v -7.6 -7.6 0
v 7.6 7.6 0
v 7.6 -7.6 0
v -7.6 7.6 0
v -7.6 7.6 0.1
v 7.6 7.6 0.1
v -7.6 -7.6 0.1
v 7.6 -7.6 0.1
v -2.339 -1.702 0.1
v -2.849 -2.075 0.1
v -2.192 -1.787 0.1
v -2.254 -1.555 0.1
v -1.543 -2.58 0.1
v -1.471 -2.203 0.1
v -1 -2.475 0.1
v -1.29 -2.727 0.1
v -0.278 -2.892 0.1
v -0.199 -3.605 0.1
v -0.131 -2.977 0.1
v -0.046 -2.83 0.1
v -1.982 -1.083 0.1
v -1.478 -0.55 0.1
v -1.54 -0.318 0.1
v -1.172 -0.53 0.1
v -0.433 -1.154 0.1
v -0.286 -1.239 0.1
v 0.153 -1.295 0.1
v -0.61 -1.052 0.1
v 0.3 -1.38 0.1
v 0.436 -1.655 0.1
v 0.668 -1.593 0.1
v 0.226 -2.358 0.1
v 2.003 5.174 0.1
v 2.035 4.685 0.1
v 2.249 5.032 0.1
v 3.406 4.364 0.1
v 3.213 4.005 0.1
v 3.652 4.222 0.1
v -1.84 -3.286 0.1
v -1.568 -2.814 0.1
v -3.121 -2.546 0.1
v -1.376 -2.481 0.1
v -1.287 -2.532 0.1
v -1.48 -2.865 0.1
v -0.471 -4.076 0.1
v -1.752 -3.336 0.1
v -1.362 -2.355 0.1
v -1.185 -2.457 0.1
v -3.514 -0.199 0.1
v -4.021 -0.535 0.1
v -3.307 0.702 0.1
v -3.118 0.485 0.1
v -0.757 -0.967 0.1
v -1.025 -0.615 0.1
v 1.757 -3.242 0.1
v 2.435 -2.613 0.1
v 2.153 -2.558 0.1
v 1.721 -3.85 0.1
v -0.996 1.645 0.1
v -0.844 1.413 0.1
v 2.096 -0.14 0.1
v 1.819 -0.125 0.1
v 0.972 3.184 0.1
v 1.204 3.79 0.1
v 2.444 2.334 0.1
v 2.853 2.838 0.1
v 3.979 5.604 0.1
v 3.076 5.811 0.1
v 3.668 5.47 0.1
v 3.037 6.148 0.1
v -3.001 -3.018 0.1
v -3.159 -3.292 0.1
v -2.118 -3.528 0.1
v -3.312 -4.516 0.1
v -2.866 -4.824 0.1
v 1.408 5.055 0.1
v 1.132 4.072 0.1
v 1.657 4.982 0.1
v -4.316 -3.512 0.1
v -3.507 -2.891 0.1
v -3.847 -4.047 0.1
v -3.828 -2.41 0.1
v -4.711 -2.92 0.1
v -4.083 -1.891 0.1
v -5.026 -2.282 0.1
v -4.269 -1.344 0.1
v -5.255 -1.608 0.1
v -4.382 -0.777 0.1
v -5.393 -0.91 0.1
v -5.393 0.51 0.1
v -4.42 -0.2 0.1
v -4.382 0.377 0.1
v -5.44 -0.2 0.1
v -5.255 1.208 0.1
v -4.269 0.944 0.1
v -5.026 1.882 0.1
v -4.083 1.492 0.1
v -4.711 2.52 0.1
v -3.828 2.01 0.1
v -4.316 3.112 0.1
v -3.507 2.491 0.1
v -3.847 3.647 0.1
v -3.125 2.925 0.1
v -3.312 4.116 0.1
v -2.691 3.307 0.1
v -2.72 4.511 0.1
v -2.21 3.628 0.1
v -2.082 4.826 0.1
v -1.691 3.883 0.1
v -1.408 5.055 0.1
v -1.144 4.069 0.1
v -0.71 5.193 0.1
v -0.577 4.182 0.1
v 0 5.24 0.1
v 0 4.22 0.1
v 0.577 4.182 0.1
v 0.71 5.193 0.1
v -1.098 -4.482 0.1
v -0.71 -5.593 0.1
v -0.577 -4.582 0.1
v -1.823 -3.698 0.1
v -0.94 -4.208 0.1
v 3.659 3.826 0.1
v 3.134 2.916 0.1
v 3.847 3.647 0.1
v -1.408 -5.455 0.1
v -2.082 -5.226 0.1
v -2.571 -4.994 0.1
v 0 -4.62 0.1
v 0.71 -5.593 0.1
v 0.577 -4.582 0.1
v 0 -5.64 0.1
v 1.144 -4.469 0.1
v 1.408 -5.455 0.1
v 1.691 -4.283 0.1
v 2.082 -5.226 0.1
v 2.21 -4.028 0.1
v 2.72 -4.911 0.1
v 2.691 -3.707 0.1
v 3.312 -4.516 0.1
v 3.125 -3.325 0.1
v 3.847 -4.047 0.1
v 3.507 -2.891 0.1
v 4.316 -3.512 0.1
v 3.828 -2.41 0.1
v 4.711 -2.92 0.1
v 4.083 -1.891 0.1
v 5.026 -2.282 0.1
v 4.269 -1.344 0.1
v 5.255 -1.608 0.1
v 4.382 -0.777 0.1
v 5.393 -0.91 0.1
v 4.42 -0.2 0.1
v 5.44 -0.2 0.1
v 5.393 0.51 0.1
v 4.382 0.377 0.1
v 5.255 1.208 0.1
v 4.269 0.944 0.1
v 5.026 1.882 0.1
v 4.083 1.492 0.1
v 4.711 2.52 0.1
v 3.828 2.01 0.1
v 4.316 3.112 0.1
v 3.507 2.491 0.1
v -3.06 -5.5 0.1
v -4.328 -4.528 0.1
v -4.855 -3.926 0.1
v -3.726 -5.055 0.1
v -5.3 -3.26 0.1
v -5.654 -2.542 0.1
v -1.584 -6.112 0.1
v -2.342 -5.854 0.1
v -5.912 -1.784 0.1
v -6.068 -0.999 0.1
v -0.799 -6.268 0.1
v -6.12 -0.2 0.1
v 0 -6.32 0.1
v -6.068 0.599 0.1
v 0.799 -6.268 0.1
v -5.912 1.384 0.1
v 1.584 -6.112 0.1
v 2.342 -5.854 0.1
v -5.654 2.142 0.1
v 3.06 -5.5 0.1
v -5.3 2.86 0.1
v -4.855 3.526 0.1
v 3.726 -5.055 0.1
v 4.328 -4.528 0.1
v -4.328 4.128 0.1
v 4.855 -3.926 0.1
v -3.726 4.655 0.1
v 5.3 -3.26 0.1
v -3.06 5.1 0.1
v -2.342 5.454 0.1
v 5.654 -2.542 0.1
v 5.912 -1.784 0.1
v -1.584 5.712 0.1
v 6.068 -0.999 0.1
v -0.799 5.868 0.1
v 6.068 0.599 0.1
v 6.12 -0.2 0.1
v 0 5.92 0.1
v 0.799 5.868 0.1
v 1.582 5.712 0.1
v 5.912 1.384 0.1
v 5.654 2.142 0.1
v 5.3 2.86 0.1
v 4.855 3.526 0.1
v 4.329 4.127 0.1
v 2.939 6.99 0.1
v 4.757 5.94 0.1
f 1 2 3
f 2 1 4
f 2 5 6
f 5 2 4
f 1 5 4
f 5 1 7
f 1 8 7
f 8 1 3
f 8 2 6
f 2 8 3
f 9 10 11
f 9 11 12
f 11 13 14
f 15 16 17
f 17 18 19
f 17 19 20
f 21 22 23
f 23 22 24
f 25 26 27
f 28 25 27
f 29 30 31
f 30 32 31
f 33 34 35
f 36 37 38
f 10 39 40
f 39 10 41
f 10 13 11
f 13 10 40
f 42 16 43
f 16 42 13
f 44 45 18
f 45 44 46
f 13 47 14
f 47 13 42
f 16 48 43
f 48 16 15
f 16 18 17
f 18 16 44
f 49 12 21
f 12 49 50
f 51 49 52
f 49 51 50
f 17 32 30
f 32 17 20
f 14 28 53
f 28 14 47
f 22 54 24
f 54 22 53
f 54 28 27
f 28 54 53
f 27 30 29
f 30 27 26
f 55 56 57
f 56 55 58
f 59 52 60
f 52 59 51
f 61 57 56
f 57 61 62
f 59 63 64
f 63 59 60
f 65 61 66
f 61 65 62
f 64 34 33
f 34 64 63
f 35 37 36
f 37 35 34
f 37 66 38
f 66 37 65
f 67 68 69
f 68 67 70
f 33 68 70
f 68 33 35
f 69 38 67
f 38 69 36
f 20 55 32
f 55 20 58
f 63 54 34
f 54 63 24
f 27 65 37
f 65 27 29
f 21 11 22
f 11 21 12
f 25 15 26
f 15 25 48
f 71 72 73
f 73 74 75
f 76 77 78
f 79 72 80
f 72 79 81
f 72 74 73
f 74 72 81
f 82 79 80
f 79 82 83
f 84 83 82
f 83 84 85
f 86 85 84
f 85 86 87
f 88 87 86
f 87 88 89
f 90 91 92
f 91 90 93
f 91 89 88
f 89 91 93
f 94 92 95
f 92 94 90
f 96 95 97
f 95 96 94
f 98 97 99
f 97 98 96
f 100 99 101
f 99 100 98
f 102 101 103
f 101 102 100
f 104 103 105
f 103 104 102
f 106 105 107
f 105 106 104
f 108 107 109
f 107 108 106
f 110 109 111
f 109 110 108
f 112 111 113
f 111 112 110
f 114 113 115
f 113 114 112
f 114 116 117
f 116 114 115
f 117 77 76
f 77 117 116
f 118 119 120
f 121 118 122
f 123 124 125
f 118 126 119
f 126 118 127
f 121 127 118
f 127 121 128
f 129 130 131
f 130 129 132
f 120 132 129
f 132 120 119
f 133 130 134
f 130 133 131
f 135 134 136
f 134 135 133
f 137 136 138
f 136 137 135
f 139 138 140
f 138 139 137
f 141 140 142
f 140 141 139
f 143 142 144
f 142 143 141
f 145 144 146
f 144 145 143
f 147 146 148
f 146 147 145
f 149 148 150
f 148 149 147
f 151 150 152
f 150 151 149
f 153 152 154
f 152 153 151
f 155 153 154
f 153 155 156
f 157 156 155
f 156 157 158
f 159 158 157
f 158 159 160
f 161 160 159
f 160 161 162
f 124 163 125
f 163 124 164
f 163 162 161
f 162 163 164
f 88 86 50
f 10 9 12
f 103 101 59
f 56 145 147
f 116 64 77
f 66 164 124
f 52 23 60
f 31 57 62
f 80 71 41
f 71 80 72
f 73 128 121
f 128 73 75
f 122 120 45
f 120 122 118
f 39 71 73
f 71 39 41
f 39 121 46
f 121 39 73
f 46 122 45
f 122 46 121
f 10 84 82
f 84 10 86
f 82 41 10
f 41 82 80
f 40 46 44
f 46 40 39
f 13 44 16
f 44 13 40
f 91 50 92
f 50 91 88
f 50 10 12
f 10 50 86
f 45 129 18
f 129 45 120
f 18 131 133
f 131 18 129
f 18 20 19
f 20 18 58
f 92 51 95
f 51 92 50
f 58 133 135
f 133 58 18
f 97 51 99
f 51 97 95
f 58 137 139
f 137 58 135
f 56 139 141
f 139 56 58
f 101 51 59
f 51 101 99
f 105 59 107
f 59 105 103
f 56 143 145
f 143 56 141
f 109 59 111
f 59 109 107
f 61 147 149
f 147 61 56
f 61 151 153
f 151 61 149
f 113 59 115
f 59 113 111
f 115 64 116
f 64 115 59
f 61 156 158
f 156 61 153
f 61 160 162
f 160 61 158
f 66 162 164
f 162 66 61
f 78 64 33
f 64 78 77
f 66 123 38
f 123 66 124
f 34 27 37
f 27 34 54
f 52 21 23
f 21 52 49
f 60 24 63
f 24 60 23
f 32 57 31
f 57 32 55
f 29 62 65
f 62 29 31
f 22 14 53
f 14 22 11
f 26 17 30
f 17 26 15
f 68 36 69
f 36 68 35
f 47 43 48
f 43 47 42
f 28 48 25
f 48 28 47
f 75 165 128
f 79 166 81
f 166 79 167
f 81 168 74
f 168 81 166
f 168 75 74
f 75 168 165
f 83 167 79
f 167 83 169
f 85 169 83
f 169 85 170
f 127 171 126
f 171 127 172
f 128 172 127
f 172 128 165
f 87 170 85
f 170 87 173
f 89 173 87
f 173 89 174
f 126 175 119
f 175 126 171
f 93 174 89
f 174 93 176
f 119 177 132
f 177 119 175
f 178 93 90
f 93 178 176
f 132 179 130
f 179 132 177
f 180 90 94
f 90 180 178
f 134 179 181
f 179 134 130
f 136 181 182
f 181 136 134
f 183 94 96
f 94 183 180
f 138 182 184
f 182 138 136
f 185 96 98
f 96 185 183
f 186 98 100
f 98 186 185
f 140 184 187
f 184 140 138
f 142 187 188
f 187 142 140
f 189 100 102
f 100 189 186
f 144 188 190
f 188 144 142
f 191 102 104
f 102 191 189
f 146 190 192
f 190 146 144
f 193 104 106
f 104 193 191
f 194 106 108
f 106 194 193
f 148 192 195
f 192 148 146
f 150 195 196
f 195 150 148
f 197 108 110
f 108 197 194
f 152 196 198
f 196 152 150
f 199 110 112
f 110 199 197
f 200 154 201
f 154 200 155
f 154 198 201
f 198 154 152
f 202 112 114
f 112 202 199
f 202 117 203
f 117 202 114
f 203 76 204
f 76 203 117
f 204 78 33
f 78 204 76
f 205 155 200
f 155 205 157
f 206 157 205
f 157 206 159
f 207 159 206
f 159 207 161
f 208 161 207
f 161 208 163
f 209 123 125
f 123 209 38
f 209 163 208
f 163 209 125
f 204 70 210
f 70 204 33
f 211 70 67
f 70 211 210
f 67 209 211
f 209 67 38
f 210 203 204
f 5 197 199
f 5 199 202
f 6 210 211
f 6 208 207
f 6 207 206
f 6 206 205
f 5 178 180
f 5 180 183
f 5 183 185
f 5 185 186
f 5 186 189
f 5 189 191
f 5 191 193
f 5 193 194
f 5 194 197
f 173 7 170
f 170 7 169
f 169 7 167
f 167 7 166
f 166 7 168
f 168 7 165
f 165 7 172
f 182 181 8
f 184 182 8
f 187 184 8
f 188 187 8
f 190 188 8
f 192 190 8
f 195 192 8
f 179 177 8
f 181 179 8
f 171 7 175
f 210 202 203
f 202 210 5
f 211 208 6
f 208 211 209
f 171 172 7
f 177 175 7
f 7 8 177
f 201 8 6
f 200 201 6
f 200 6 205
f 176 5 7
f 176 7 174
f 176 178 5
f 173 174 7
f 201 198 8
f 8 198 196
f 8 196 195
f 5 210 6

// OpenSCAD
// file: ../p/logo-launchcommand-bg.scad
use <../lib.scad>
function ldraw_lib__logo_launchcommand_bg() = [
// 0 Launch Command Logo Background (without Border)
// 0 Name: logo-launchcommand-bg.dat
// 0 Author: Chris Böhnke [KnightOfTarenta]
// 0 !LDRAW_ORG Primitive UPDATE 2025-05
// 0 !LICENSE Licensed under CC BY 4.0 : see CAreadme.txt
// 
// 0 !HELP Dimensions X = 32; Z = 34.67
// 
// 0 BFC CERTIFY CCW
  [0,"BFC","CERTIFY"],
  [0,"BFC","CCW"],
// 
// 0 !HISTORY 2025-04-27 [OrionP] Official Update 2025-04
// 0 !HISTORY 2025-05-24 [Holly-Wood] Updated description
// 0 !HISTORY 2025-05-28 [OrionP] Official Update 2025-05
// 
// 0 // Colour 16 Main Colour
// 3 16 -12.889 0 -1.697 -12.557 0 -3.365 -11.826 0 -.984
  [3,16,-12.889,0,-1.697,-12.557,0,-3.365,-11.826,0,-.984],
// 3 16 -8.38 0 -5.514 -6.88 0 -4.417 -6.63 0 -3.984
  [3,16,-8.38,0,-5.514,-6.88,0,-4.417,-6.63,0,-3.984],
// 3 16 -9.192 0 9.192 -10.314 0 7.914 -2.929 0 5.426
  [3,16,-9.192,0,9.192,-10.314,0,7.914,-2.929,0,5.426],
// 3 16 7.161 0 -7.097 11.258 0 -6.5 12.01 0 -4.975
  [3,16,7.161,0,-7.097,11.258,0,-6.5,12.01,0,-4.975],
// 3 16 1.697 0 12.889 3.542 0 11.736 3.329 0 12.566
  [3,16,1.697,0,12.889,3.542,0,11.736,3.329,0,12.566],
// 3 16 8.392 0 8.936 10.314 0 7.914 9.218 0 9.166
  [3,16,8.392,0,8.936,10.314,0,7.914,9.218,0,9.166],
// 3 16 -9.171 0 2.016 -4.53 0 -.347 -2.483 0 4.744
  [3,16,-9.171,0,2.016,-4.53,0,-.347,-2.483,0,4.744],
// 3 16 1.965 0 -4.097 6.331 0 -6.934 5.35 0 .222
  [3,16,1.965,0,-4.097,6.331,0,-6.934,5.35,0,.222],
// 4 16 -9.18 0 -6.9 -10.314 0 -7.914 -9.291 0 -9.093 -8.827 0 -8.289
  [4,16,-9.18,0,-6.9,-10.314,0,-7.914,-9.291,0,-9.093,-8.827,0,-8.289],
// 4 16 -7.563 0 -14.1 -5.363 0 -10.289 -6.229 0 -9.789 -8.429 0 -13.6
  [4,16,-7.563,0,-14.1,-5.363,0,-10.289,-6.229,0,-9.789,-8.429,0,-13.6],
// 4 16 -1.386 0 -11.4 -2.765 0 -11.789 -3.229 0 -12.593 -1.697 0 -12.889
  [4,16,-1.386,0,-11.4,-2.765,0,-11.789,-3.229,0,-12.593,-1.697,0,-12.889],
// 4 16 -9.18 0 -6.9 -8.827 0 -8.289 -6.229 0 -9.789 -5.413 0 -9.075
  [4,16,-9.18,0,-6.9,-8.827,0,-8.289,-6.229,0,-9.789,-5.413,0,-9.075],
// 4 16 -5.413 0 -9.075 -6.229 0 -9.789 -5.363 0 -10.289 -5.153 0 -9.225
  [4,16,-5.413,0,-9.075,-6.229,0,-9.789,-5.363,0,-10.289,-5.153,0,-9.225],
// 4 16 -1.386 0 -11.4 -5.153 0 -9.225 -5.363 0 -10.289 -2.765 0 -11.789
  [4,16,-1.386,0,-11.4,-5.153,0,-9.225,-5.363,0,-10.289,-2.765,0,-11.789],
// 4 16 -12.557 0 -3.365 -12.01 0 -4.975 -11.258 0 -6.5 -8.38 0 -5.514
  [4,16,-12.557,0,-3.365,-12.01,0,-4.975,-11.258,0,-6.5,-8.38,0,-5.514],
// 4 16 -10.314 0 -7.914 -9.18 0 -6.9 -8.38 0 -5.514 -11.258 0 -6.5
  [4,16,-10.314,0,-7.914,-9.18,0,-6.9,-8.38,0,-5.514,-11.258,0,-6.5],
// 4 16 -4.613 0 -7.689 -5.413 0 -9.075 -5.153 0 -9.225 -4.353 0 -7.839
  [4,16,-4.613,0,-7.689,-5.413,0,-9.075,-5.153,0,-9.225,-4.353,0,-7.839],
// 4 16 -3.794 0 -7.431 -4.538 0 -7.001 -4.613 0 -7.689 -4.353 0 -7.839
  [4,16,-3.794,0,-7.431,-4.538,0,-7.001,-4.613,0,-7.689,-4.353,0,-7.839],
// 4 16 -12.889 0 -1.697 -11.826 0 -.984 -12.889 0 1.697 -13 0 0
  [4,16,-12.889,0,-1.697,-11.826,0,-.984,-12.889,0,1.697,-13,0,0],
// 4 16 -12.557 0 -3.365 -8.38 0 -5.514 -6.63 0 -3.984 -11.826 0 -.984
  [4,16,-12.557,0,-3.365,-8.38,0,-5.514,-6.63,0,-3.984,-11.826,0,-.984],
// 4 16 -1.697 0 -12.889 0 0 -13 -.586 0 -10.014 -1.386 0 -11.4
  [4,16,-1.697,0,-12.889,0,0,-13,-.586,0,-10.014,-1.386,0,-11.4],
// 4 16 0 0 -13 1.697 0 -12.889 3.365 0 -12.557 -.586 0 -10.014
  [4,16,0,0,-13,1.697,0,-12.889,3.365,0,-12.557,-.586,0,-10.014],
// 4 16 5.061 0 -10.734 -.135 0 -7.734 -.385 0 -8.167 -.586 0 -10.014
  [4,16,5.061,0,-10.734,-.135,0,-7.734,-.385,0,-8.167,-.586,0,-10.014],
// 4 16 -11.826 0 -.984 -9.726 0 2.653 -12.557 0 3.365 -12.889 0 1.697
  [4,16,-11.826,0,-.984,-9.726,0,2.653,-12.557,0,3.365,-12.889,0,1.697],
// 4 16 -.586 0 -10.014 3.365 0 -12.557 4.975 0 -12.01 5.061 0 -10.734
  [4,16,-.586,0,-10.014,3.365,0,-12.557,4.975,0,-12.01,5.061,0,-10.734],
// 4 16 -12.557 0 3.365 -9.726 0 2.653 -11.258 0 6.5 -12.01 0 4.975
  [4,16,-12.557,0,3.365,-9.726,0,2.653,-11.258,0,6.5,-12.01,0,4.975],
// 4 16 4.975 0 -12.01 6.5 0 -11.258 7.914 0 -10.314 5.061 0 -10.734
  [4,16,4.975,0,-12.01,6.5,0,-11.258,7.914,0,-10.314,5.061,0,-10.734],
// 4 16 5.061 0 -10.734 7.914 0 -10.314 9.192 0 -9.192 7.161 0 -7.097
  [4,16,5.061,0,-10.734,7.914,0,-10.314,9.192,0,-9.192,7.161,0,-7.097],
// 4 16 -11.258 0 6.5 -9.726 0 2.653 -2.929 0 5.426 -10.314 0 7.914
  [4,16,-11.258,0,6.5,-9.726,0,2.653,-2.929,0,5.426,-10.314,0,7.914],
// 4 16 -6.5 0 11.258 -7.914 0 10.314 -9.192 0 9.192 -2.929 0 5.426
  [4,16,-6.5,0,11.258,-7.914,0,10.314,-9.192,0,9.192,-2.929,0,5.426],
// 4 16 9.192 0 -9.192 10.314 0 -7.914 11.258 0 -6.5 7.161 0 -7.097
  [4,16,9.192,0,-9.192,10.314,0,-7.914,11.258,0,-6.5,7.161,0,-7.097],
// 4 16 -3.365 0 12.557 -4.975 0 12.01 -6.5 0 11.258 -2.929 0 5.426
  [4,16,-3.365,0,12.557,-4.975,0,12.01,-6.5,0,11.258,-2.929,0,5.426],
// 4 16 7.161 0 -7.097 12.01 0 -4.975 12.557 0 -3.365 6.164 0 .176
  [4,16,7.161,0,-7.097,12.01,0,-4.975,12.557,0,-3.365,6.164,0,.176],
// 4 16 12.557 0 -3.365 12.889 0 -1.697 13 0 0 6.164 0 .176
  [4,16,12.557,0,-3.365,12.889,0,-1.697,13,0,0,6.164,0,.176],
// 4 16 -3.365 0 12.557 -2.929 0 5.426 0 0 13 -1.697 0 12.889
  [4,16,-3.365,0,12.557,-2.929,0,5.426,0,0,13,-1.697,0,12.889],
// 4 16 -2.929 0 5.426 3.542 0 11.736 1.697 0 12.889 0 0 13
  [4,16,-2.929,0,5.426,3.542,0,11.736,1.697,0,12.889,0,0,13],
// 4 16 13 0 0 12.889 0 1.697 12.557 0 3.365 6.164 0 .176
  [4,16,13,0,0,12.889,0,1.697,12.557,0,3.365,6.164,0,.176],
// 4 16 11.258 0 6.5 6.164 0 .176 12.557 0 3.365 12.01 0 4.975
  [4,16,11.258,0,6.5,6.164,0,.176,12.557,0,3.365,12.01,0,4.975],
// 4 16 10.314 0 7.914 8.392 0 8.936 6.164 0 .176 11.258 0 6.5
  [4,16,10.314,0,7.914,8.392,0,8.936,6.164,0,.176,11.258,0,6.5],
// 4 16 5.892 0 15.806 4.873 0 15.24 3.329 0 12.566 3.542 0 11.736
  [4,16,5.892,0,15.806,4.873,0,15.24,3.329,0,12.566,3.542,0,11.736],
// 4 16 10.742 0 13.006 8.392 0 8.936 9.218 0 9.166 10.762 0 11.84
  [4,16,10.742,0,13.006,8.392,0,8.936,9.218,0,9.166,10.762,0,11.84],
// 4 16 .449 0 -3.222 9.449 0 12.367 5.985 0 14.367 -3.015 0 -1.222
  [4,16,.449,0,-3.222,9.449,0,12.367,5.985,0,14.367,-3.015,0,-1.222],
// 4 16 -10.334 0 .002 -5.83 0 -2.598 -4.53 0 -.347 -9.171 0 2.016
  [4,16,-10.334,0,.002,-5.83,0,-2.598,-4.53,0,-.347,-9.171,0,2.016],
// 4 16 2.859 0 9.952 -2.483 0 4.744 -4.53 0 -.347 -3.448 0 -.972
  [4,16,2.859,0,9.952,-2.483,0,4.744,-4.53,0,-.347,-3.448,0,-.972],
// 4 16 1.965 0 -4.097 .665 0 -6.348 5.168 0 -8.948 6.331 0 -6.934
  [4,16,1.965,0,-4.097,.665,0,-6.348,5.168,0,-8.948,6.331,0,-6.934],
// 4 16 7.189 0 7.452 .882 0 -3.472 1.965 0 -4.097 5.35 0 .222
  [4,16,7.189,0,7.452,.882,0,-3.472,1.965,0,-4.097,5.35,0,.222],
// 4 16 -6.447 0 -4.667 -4.326 0 -5.892 -2.226 0 -2.255 -4.347 0 -1.03
  [4,16,-6.447,0,-4.667,-4.326,0,-5.892,-2.226,0,-2.255,-4.347,0,-1.03],
// 4 16 -.818 0 -7.917 1.282 0 -4.28 -.84 0 -3.055 -2.94 0 -6.692
  [4,16,-.818,0,-7.917,1.282,0,-4.28,-.84,0,-3.055,-2.94,0,-6.692],
// 4 16 10.019 0 13.424 10.787 0 16.675 9.047 0 17.68 6.616 0 15.388
  [4,16,10.019,0,13.424,10.787,0,16.675,9.047,0,17.68,6.616,0,15.388],
// 4 16 -4.046 0 -6.708 -3.786 0 -6.858 -3.486 0 -6.638 -4.006 0 -6.338
  [4,16,-4.046,0,-6.708,-3.786,0,-6.858,-3.486,0,-6.638,-4.006,0,-6.338],
// 4 16 -3.486 0 -6.638 -1.273 0 -2.805 -1.793 0 -2.505 -4.006 0 -6.338
  [4,16,-3.486,0,-6.638,-1.273,0,-2.805,-1.793,0,-2.505,-4.006,0,-6.338],
];
module ldraw_lib__logo_launchcommand_bg(step=0, col=false, unit=2/5, alt=false, line=0.2, solid=!$preview)
    makepoly(ldraw_lib__logo_launchcommand_bg(), step=step, col=col, unit=unit, alt=alt, line=line, solid=solid);
ldraw_lib__logo_launchcommand_bg(line=0.2);
// file: s/3068bp11s01.scad
use <../../lib.scad>
use <../../p/logo-launchcommand-bg.scad>
use <../../p/logo-launchcommand.scad>
function ldraw_lib__s__3068bp11s01() = [
// 0 ~Launch Command Logo Pattern (without Border)
// 0 Name: s\3068bp11s01.dat
// 0 Author: Chris Böhnke [KnightOfTarenta]
// 0 !LDRAW_ORG Subpart UPDATE 2026-02
// 0 !LICENSE Licensed under CC BY 4.0 : see CAreadme.txt
// 
// 0 !HELP Dimensions X = 32; Z = 34.67
// 
// 0 BFC CERTIFY CCW
  [0,"BFC","CERTIFY"],
  [0,"BFC","CCW"],
// 
// 0 !HISTORY 2025-03-30 [OrionP] Official Update 2025-03
// 0 !HISTORY 2025-04-04 [KnightOfTarenta] Sub-filed
// 0 !HISTORY 2026-03-06 [OrionP] Official Update 2026-02
// 
// 1 16 0 0 0 1 0 0 0 1 0 0 0 1 logo-launchcommand.dat
  [1,16,0,0,0,1,0,0,0,1,0,0,0,1, ldraw_lib__logo_launchcommand()],
// 1 16 0 0 0 1 0 0 0 1 0 0 0 1 logo-launchcommand-bg.dat
  [1,16,0,0,0,1,0,0,0,1,0,0,0,1, ldraw_lib__logo_launchcommand_bg()],
];
module ldraw_lib__s__3068bp11s01(step=0, col=false, unit=2/5, alt=false, line=0.2, solid=!$preview)
    makepoly(ldraw_lib__s__3068bp11s01(), step=step, col=col, unit=unit, alt=alt, line=line, solid=solid);
ldraw_lib__s__3068bp11s01(line=0.2);
// file: s/169665es01.scad
use <../../lib.scad>
function ldraw_lib__s__169665es01() = [
// 0 ~Outline for Launch Command Logo
// 0 Name: s\169665es01.dat
// 0 Author: Chris Böhnke [KnightOfTarenta]
// 0 !LDRAW_ORG Subpart UPDATE 2026-02
// 0 !LICENSE Licensed under CC BY 4.0 : see CAreadme.txt
// 
// 0 BFC CERTIFY CCW
  [0,"BFC","CERTIFY"],
  [0,"BFC","CCW"],
// 
// 0 !HISTORY 2026-03-06 [OrionP] Official Update 2026-02
// 
// 3 16 -8.429 0 -13.6 -9 0 -15.589 -7.563 0 -14.1
  [3,16,-8.429,0,-13.6,-9,0,-15.589,-7.563,0,-14.1],
// 4 16 -14.28 0 -10.958 -12.728 0 -12.728 -11.314 0 -11.314 -12.694 0 -9.74
  [4,16,-14.28,0,-10.958,-12.728,0,-12.728,-11.314,0,-11.314,-12.694,0,-9.74],
// 4 16 -12.728 0 -12.728 -10.958 0 -14.28 -9.74 0 -12.694 -11.314 0 -11.314
  [4,16,-12.728,0,-12.728,-10.958,0,-14.28,-9.74,0,-12.694,-11.314,0,-11.314],
// 4 16 -9 0 -15.589 -8.429 0 -13.6 -9.74 0 -12.694 -10.958 0 -14.28
  [4,16,-9,0,-15.589,-8.429,0,-13.6,-9.74,0,-12.694,-10.958,0,-14.28],
// 4 16 -12.694 0 -9.74 -13.856 0 -8 -15.588 0 -9 -14.28 0 -10.958
  [4,16,-12.694,0,-9.74,-13.856,0,-8,-15.588,0,-9,-14.28,0,-10.958],
// 4 16 -13.856 0 -8 -14.782 0 -6.123 -16.63 0 -6.888 -15.588 0 -9
  [4,16,-13.856,0,-8,-14.782,0,-6.123,-16.63,0,-6.888,-15.588,0,-9],
// 4 16 -4.141 0 -15.455 -6.123 0 -14.782 -6.888 0 -16.63 -4.659 0 -17.387
  [4,16,-4.141,0,-15.455,-6.123,0,-14.782,-6.888,0,-16.63,-4.659,0,-17.387],
// 4 16 -9 0 -15.589 -6.888 0 -16.63 -6.123 0 -14.782 -7.563 0 -14.1
  [4,16,-9,0,-15.589,-6.888,0,-16.63,-6.123,0,-14.782,-7.563,0,-14.1],
// 4 16 -14.782 0 -6.123 -15.455 0 -4.141 -17.387 0 -4.659 -16.63 0 -6.888
  [4,16,-14.782,0,-6.123,-15.455,0,-4.141,-17.387,0,-4.659,-16.63,0,-6.888],
// 4 16 -15.455 0 -4.141 -15.863 0 -2.088 -17.846 0 -2.35 -17.387 0 -4.659
  [4,16,-15.455,0,-4.141,-15.863,0,-2.088,-17.846,0,-2.35,-17.387,0,-4.659],
// 4 16 -4.659 0 -17.387 -2.349 0 -17.846 -2.088 0 -15.863 -4.141 0 -15.455
  [4,16,-4.659,0,-17.387,-2.349,0,-17.846,-2.088,0,-15.863,-4.141,0,-15.455],
// 4 16 -15.863 0 -2.088 -16 0 0 -18 0 0 -17.846 0 -2.35
  [4,16,-15.863,0,-2.088,-16,0,0,-18,0,0,-17.846,0,-2.35],
// 4 16 -2.349 0 -17.846 0 0 -18 0 0 -16 -2.088 0 -15.863
  [4,16,-2.349,0,-17.846,0,0,-18,0,0,-16,-2.088,0,-15.863],
// 4 16 -16 0 0 -15.863 0 2.088 -17.846 0 2.349 -18 0 0
  [4,16,-16,0,0,-15.863,0,2.088,-17.846,0,2.349,-18,0,0],
// 4 16 0 0 -18 2.349 0 -17.846 2.088 0 -15.863 0 0 -16
  [4,16,0,0,-18,2.349,0,-17.846,2.088,0,-15.863,0,0,-16],
// 4 16 -15.863 0 2.088 -15.455 0 4.141 -17.387 0 4.659 -17.846 0 2.349
  [4,16,-15.863,0,2.088,-15.455,0,4.141,-17.387,0,4.659,-17.846,0,2.349],
// 4 16 2.349 0 -17.846 4.659 0 -17.387 4.141 0 -15.455 2.088 0 -15.863
  [4,16,2.349,0,-17.846,4.659,0,-17.387,4.141,0,-15.455,2.088,0,-15.863],
// 4 16 6.123 0 -14.782 4.141 0 -15.455 4.659 0 -17.387 6.888 0 -16.63
  [4,16,6.123,0,-14.782,4.141,0,-15.455,4.659,0,-17.387,6.888,0,-16.63],
// 4 16 -15.455 0 4.141 -14.782 0 6.123 -16.63 0 6.888 -17.387 0 4.659
  [4,16,-15.455,0,4.141,-14.782,0,6.123,-16.63,0,6.888,-17.387,0,4.659],
// 4 16 8 0 -13.856 6.123 0 -14.782 6.888 0 -16.63 9 0 -15.589
  [4,16,8,0,-13.856,6.123,0,-14.782,6.888,0,-16.63,9,0,-15.589],
// 4 16 -14.782 0 6.123 -13.856 0 8 -15.588 0 9 -16.63 0 6.888
  [4,16,-14.782,0,6.123,-13.856,0,8,-15.588,0,9,-16.63,0,6.888],
// 4 16 -13.856 0 8 -12.694 0 9.74 -14.28 0 10.958 -15.588 0 9
  [4,16,-13.856,0,8,-12.694,0,9.74,-14.28,0,10.958,-15.588,0,9],
// 4 16 8 0 -13.856 9 0 -15.589 10.958 0 -14.28 9.74 0 -12.694
  [4,16,8,0,-13.856,9,0,-15.589,10.958,0,-14.28,9.74,0,-12.694],
// 4 16 10.958 0 -14.28 12.728 0 -12.728 11.314 0 -11.314 9.74 0 -12.694
  [4,16,10.958,0,-14.28,12.728,0,-12.728,11.314,0,-11.314,9.74,0,-12.694],
// 4 16 -12.694 0 9.74 -11.314 0 11.314 -12.728 0 12.728 -14.28 0 10.958
  [4,16,-12.694,0,9.74,-11.314,0,11.314,-12.728,0,12.728,-14.28,0,10.958],
// 4 16 14.28 0 -10.958 12.694 0 -9.74 11.314 0 -11.314 12.728 0 -12.728
  [4,16,14.28,0,-10.958,12.694,0,-9.74,11.314,0,-11.314,12.728,0,-12.728],
// 4 16 -11.314 0 11.314 -9.74 0 12.694 -10.958 0 14.28 -12.728 0 12.728
  [4,16,-11.314,0,11.314,-9.74,0,12.694,-10.958,0,14.28,-12.728,0,12.728],
// 4 16 12.694 0 -9.74 14.28 0 -10.958 15.588 0 -9 13.856 0 -8
  [4,16,12.694,0,-9.74,14.28,0,-10.958,15.588,0,-9,13.856,0,-8],
// 4 16 -9.74 0 12.694 -8 0 13.856 -9 0 15.588 -10.958 0 14.28
  [4,16,-9.74,0,12.694,-8,0,13.856,-9,0,15.588,-10.958,0,14.28],
// 4 16 -6.888 0 16.63 -9 0 15.588 -8 0 13.856 -6.123 0 14.782
  [4,16,-6.888,0,16.63,-9,0,15.588,-8,0,13.856,-6.123,0,14.782],
// 4 16 15.588 0 -9 16.63 0 -6.888 14.782 0 -6.123 13.856 0 -8
  [4,16,15.588,0,-9,16.63,0,-6.888,14.782,0,-6.123,13.856,0,-8],
// 4 16 17.387 0 -4.659 15.455 0 -4.141 14.782 0 -6.123 16.63 0 -6.888
  [4,16,17.387,0,-4.659,15.455,0,-4.141,14.782,0,-6.123,16.63,0,-6.888],
// 4 16 -4.141 0 15.455 -4.659 0 17.387 -6.888 0 16.63 -6.123 0 14.782
  [4,16,-4.141,0,15.455,-4.659,0,17.387,-6.888,0,16.63,-6.123,0,14.782],
// 4 16 17.387 0 -4.659 17.846 0 -2.35 15.863 0 -2.088 15.455 0 -4.141
  [4,16,17.387,0,-4.659,17.846,0,-2.35,15.863,0,-2.088,15.455,0,-4.141],
// 4 16 -2.088 0 15.863 -2.349 0 17.846 -4.659 0 17.387 -4.141 0 15.455
  [4,16,-2.088,0,15.863,-2.349,0,17.846,-4.659,0,17.387,-4.141,0,15.455],
// 4 16 17.846 0 2.349 15.863 0 2.088 16 0 0 18 0 0
  [4,16,17.846,0,2.349,15.863,0,2.088,16,0,0,18,0,0],
// 4 16 17.846 0 -2.35 18 0 0 16 0 0 15.863 0 -2.088
  [4,16,17.846,0,-2.35,18,0,0,16,0,0,15.863,0,-2.088],
// 4 16 -2.088 0 15.863 0 0 16 0 0 18 -2.349 0 17.846
  [4,16,-2.088,0,15.863,0,0,16,0,0,18,-2.349,0,17.846],
// 4 16 2.088 0 15.863 2.349 0 17.846 0 0 18 0 0 16
  [4,16,2.088,0,15.863,2.349,0,17.846,0,0,18,0,0,16],
// 4 16 2.349 0 17.846 2.088 0 15.863 4.141 0 15.455 4.654 0 17.387
  [4,16,2.349,0,17.846,2.088,0,15.863,4.141,0,15.455,4.654,0,17.387],
// 4 16 5.892 0 15.806 4.654 0 17.387 4.141 0 15.455 4.873 0 15.24
  [4,16,5.892,0,15.806,4.654,0,17.387,4.141,0,15.455,4.873,0,15.24],
// 4 16 15.455 0 4.141 15.863 0 2.088 17.846 0 2.349 17.387 0 4.659
  [4,16,15.455,0,4.141,15.863,0,2.088,17.846,0,2.349,17.387,0,4.659],
// 4 16 15.455 0 4.141 17.387 0 4.659 16.63 0 6.888 14.782 0 6.123
  [4,16,15.455,0,4.141,17.387,0,4.659,16.63,0,6.888,14.782,0,6.123],
// 4 16 16.63 0 6.888 15.588 0 9 13.856 0 8 14.782 0 6.123
  [4,16,16.63,0,6.888,15.588,0,9,13.856,0,8,14.782,0,6.123],
// 4 16 15.588 0 9 14.28 0 10.958 12.694 0 9.74 13.856 0 8
  [4,16,15.588,0,9,14.28,0,10.958,12.694,0,9.74,13.856,0,8],
// 4 16 10.742 0 13.006 10.762 0 11.84 11.314 0 11.314 12.731 0 12.725
  [4,16,10.742,0,13.006,10.762,0,11.84,11.314,0,11.314,12.731,0,12.725],
// 4 16 14.28 0 10.958 12.731 0 12.725 11.314 0 11.314 12.694 0 9.74
  [4,16,14.28,0,10.958,12.731,0,12.725,11.314,0,11.314,12.694,0,9.74],
// 4 16 5.892 0 15.806 8.932 0 18.67 8.643 0 21.146 4.654 0 17.387
  [4,16,5.892,0,15.806,8.932,0,18.67,8.643,0,21.146,4.654,0,17.387],
// 4 16 8.643 0 21.146 8.932 0 18.67 11.703 0 17.07 13.992 0 18.058
  [4,16,8.643,0,21.146,8.932,0,18.67,11.703,0,17.07,13.992,0,18.058],
// 4 16 10.742 0 13.006 12.731 0 12.725 13.992 0 18.058 11.703 0 17.07
  [4,16,10.742,0,13.006,12.731,0,12.725,13.992,0,18.058,11.703,0,17.07],
];
module ldraw_lib__s__169665es01(step=0, col=false, unit=2/5, alt=false, line=0.2, solid=!$preview)
    makepoly(ldraw_lib__s__169665es01(), step=step, col=col, unit=unit, alt=alt, line=line, solid=solid);
ldraw_lib__s__169665es01(line=0.2);
// file: ../p/box5-12.scad
use <../lib.scad>
function ldraw_lib__box5_12() = [
// 0 Box with 5 Faces without Any Edges
// 0 Name: box5-12.dat
// 0 Author: Chris Dee [cwdee]
// 0 !LDRAW_ORG Primitive UPDATE 2009-02
// 0 !LICENSE Licensed under CC BY 4.0 : see CAreadme.txt
// 
// 0 BFC CERTIFY CCW
  [0,"BFC","CERTIFY"],
  [0,"BFC","CCW"],
// 
// 0 !HISTORY 2009-09-03 [PTadmin] Official Update 2009-02
// 
// 
// 4 16 1 1 1 1 1 -1 -1 1 -1 -1 1 1
  [4,16,1,1,1,1,1,-1,-1,1,-1,-1,1,1],
// 4 16 -1 0 1 1 0 1 1 1 1 -1 1 1
  [4,16,-1,0,1,1,0,1,1,1,1,-1,1,1],
// 4 16 -1 0 -1 -1 0 1 -1 1 1 -1 1 -1
  [4,16,-1,0,-1,-1,0,1,-1,1,1,-1,1,-1],
// 4 16 1 0 -1 -1 0 -1 -1 1 -1 1 1 -1
  [4,16,1,0,-1,-1,0,-1,-1,1,-1,1,1,-1],
// 4 16 1 0 1 1 0 -1 1 1 -1 1 1 1
  [4,16,1,0,1,1,0,-1,1,1,-1,1,1,1],
// 0
];
module ldraw_lib__box5_12(step=0, col=false, unit=2/5, alt=false, line=0.2, solid=!$preview)
    makepoly(ldraw_lib__box5_12(), step=step, col=col, unit=unit, alt=alt, line=line, solid=solid);
ldraw_lib__box5_12(line=0.2);
// main file
use <../lib.scad>
use <../p/box5-12.scad>
use <s/169665es01.scad>
use <s/3068bp11s01.scad>
function ldraw_lib__169655e() = [
// 0 Sticker  1.9 x  1.9 with Launch Command Logo with White Border Facing Right
// 0 Name: 169655e.dat
// 0 Author: Chris Böhnke [KnightOfTarenta]
// 0 !LDRAW_ORG Part UPDATE 2026-02
// 0 !LICENSE Licensed under CC BY 4.0 : see CAreadme.txt
// 
// 0 BFC CERTIFY CCW
  [0,"BFC","CERTIFY"],
  [0,"BFC","CCW"],
// 
// 0 !KEYWORDS Bricklink 6544stk01, Brickowl 420128, Launch Command
// 0 !KEYWORDS Rebrickable 169655, Set 6544, Shuttle Transcon 2, space port, stamp
// 0 !KEYWORDS town
// 
// 0 !HISTORY 2026-03-06 [OrionP] Official Update 2026-02
// 
// 1 16 0 -0.25 0 19 0 0 0 0.25 0 0 0 19 box5-12.dat
  [1,16,0,-0.25,0,19,0,0,0,0.25,0,0,0,19, ldraw_lib__box5_12()],
// 
// 0 BFC NOCLIP
  [0,"BFC","NOCLIP"],
// 1 15 0 -.25 -.5 .85 0 0 0 1 0 0 0 .85 s\3068bp11s01.dat
  [1,15,0,-.25,-.5,.85,0,0,0,1,0,0,0,.85, ldraw_lib__s__3068bp11s01()],
// 1 15 0 -.25 -.5 .85 0 0 0 1 0 0 0 .85 s\169665es01.dat
  [1,15,0,-.25,-.5,.85,0,0,0,1,0,0,0,.85, ldraw_lib__s__169665es01()],
// 
// 0 BFC CLIP
  [0,"BFC","CLIP"],
// 0 // Colour 16 Main Colour
// 3 16 7.34655 -.25 17.4741 1.99665 -.25 14.6691 3.9559 -.25 14.27895
  [3,16,7.34655,-.25,17.4741,1.99665,-.25,14.6691,3.9559,-.25,14.27895],
// 3 16 -19 -.25 19 -3.96015 -.25 14.27895 -1.99665 -.25 14.6691
  [3,16,-19,-.25,19,-3.96015,-.25,14.27895,-1.99665,-.25,14.6691],
// 3 16 -19 -.25 19 -1.99665 -.25 14.6691 0 -.25 14.8
  [3,16,-19,-.25,19,-1.99665,-.25,14.6691,0,-.25,14.8],
// 3 16 19 -.25 19 7.34655 -.25 17.4741 11.8932 -.25 14.8493
  [3,16,19,-.25,19,7.34655,-.25,17.4741,11.8932,-.25,14.8493],
// 3 16 19 -.25 19 12.138 -.25 8.8143 13.2498 -.25 7.15
  [3,16,19,-.25,19,12.138,-.25,8.8143,13.2498,-.25,7.15],
// 3 16 19 -.25 19 13.2498 -.25 7.15 14.1355 -.25 5.3548
  [3,16,19,-.25,19,13.2498,-.25,7.15,14.1355,-.25,5.3548],
// 3 16 19 -.25 19 14.1355 -.25 5.3548 14.77895 -.25 3.46015
  [3,16,19,-.25,19,14.1355,-.25,5.3548,14.77895,-.25,3.46015],
// 3 16 -19 -.25 19 -15.1691 -.25 1.49665 -14.77895 -.25 3.46015
  [3,16,-19,-.25,19,-15.1691,-.25,1.49665,-14.77895,-.25,3.46015],
// 3 16 -19 -.25 19 -14.77895 -.25 3.46015 -14.1355 -.25 5.3548
  [3,16,-19,-.25,19,-14.77895,-.25,3.46015,-14.1355,-.25,5.3548],
// 3 16 -19 -.25 19 -14.1355 -.25 5.3548 -13.2498 -.25 7.15
  [3,16,-19,-.25,19,-14.1355,-.25,5.3548,-13.2498,-.25,7.15],
// 3 16 -19 -.25 19 -13.2498 -.25 7.15 -12.138 -.25 8.8143
  [3,16,-19,-.25,19,-13.2498,-.25,7.15,-12.138,-.25,8.8143],
// 3 16 -19 -.25 19 -12.138 -.25 8.8143 -10.8188 -.25 10.3188
  [3,16,-19,-.25,19,-12.138,-.25,8.8143,-10.8188,-.25,10.3188],
// 3 16 -19 -.25 19 -10.8188 -.25 10.3188 -9.3143 -.25 11.638
  [3,16,-19,-.25,19,-10.8188,-.25,10.3188,-9.3143,-.25,11.638],
// 3 16 -19 -.25 19 -9.3143 -.25 11.638 -7.65 -.25 12.7498
  [3,16,-19,-.25,19,-9.3143,-.25,11.638,-7.65,-.25,12.7498],
// 3 16 -19 -.25 19 -7.65 -.25 12.7498 -5.8548 -.25 13.6355
  [3,16,-19,-.25,19,-7.65,-.25,12.7498,-5.8548,-.25,13.6355],
// 3 16 -19 -.25 19 -5.8548 -.25 13.6355 -3.96015 -.25 14.27895
  [3,16,-19,-.25,19,-5.8548,-.25,13.6355,-3.96015,-.25,14.27895],
// 3 16 -14.77895 -.25 -4.46015 -19 -.25 -19 -14.1355 -.25 -6.3548
  [3,16,-14.77895,-.25,-4.46015,-19,-.25,-19,-14.1355,-.25,-6.3548],
// 3 16 -14.1355 -.25 -6.3548 -19 -.25 -19 -13.2498 -.25 -8.15
  [3,16,-14.1355,-.25,-6.3548,-19,-.25,-19,-13.2498,-.25,-8.15],
// 3 16 -13.2498 -.25 -8.15 -19 -.25 -19 -12.138 -.25 -9.8143
  [3,16,-13.2498,-.25,-8.15,-19,-.25,-19,-12.138,-.25,-9.8143],
// 3 16 -12.138 -.25 -9.8143 -19 -.25 -19 -10.8188 -.25 -11.3188
  [3,16,-12.138,-.25,-9.8143,-19,-.25,-19,-10.8188,-.25,-11.3188],
// 3 16 -10.8188 -.25 -11.3188 -19 -.25 -19 -9.3143 -.25 -12.638
  [3,16,-10.8188,-.25,-11.3188,-19,-.25,-19,-9.3143,-.25,-12.638],
// 3 16 -9.3143 -.25 -12.638 -19 -.25 -19 -7.65 -.25 -13.75065
  [3,16,-9.3143,-.25,-12.638,-19,-.25,-19,-7.65,-.25,-13.75065],
// 3 16 -7.65 -.25 -13.75065 -19 -.25 -19 -5.8548 -.25 -14.6355
  [3,16,-7.65,-.25,-13.75065,-19,-.25,-19,-5.8548,-.25,-14.6355],
// 3 16 5.8548 -.25 -14.6355 3.96015 -.25 -15.27895 19 -.25 -19
  [3,16,5.8548,-.25,-14.6355,3.96015,-.25,-15.27895,19,-.25,-19],
// 3 16 7.65 -.25 -13.75065 5.8548 -.25 -14.6355 19 -.25 -19
  [3,16,7.65,-.25,-13.75065,5.8548,-.25,-14.6355,19,-.25,-19],
// 3 16 9.3143 -.25 -12.638 7.65 -.25 -13.75065 19 -.25 -19
  [3,16,9.3143,-.25,-12.638,7.65,-.25,-13.75065,19,-.25,-19],
// 3 16 10.8188 -.25 -11.3188 9.3143 -.25 -12.638 19 -.25 -19
  [3,16,10.8188,-.25,-11.3188,9.3143,-.25,-12.638,19,-.25,-19],
// 3 16 12.138 -.25 -9.8143 10.8188 -.25 -11.3188 19 -.25 -19
  [3,16,12.138,-.25,-9.8143,10.8188,-.25,-11.3188,19,-.25,-19],
// 3 16 13.2498 -.25 -8.15 12.138 -.25 -9.8143 19 -.25 -19
  [3,16,13.2498,-.25,-8.15,12.138,-.25,-9.8143,19,-.25,-19],
// 3 16 14.1355 -.25 -6.3548 13.2498 -.25 -8.15 19 -.25 -19
  [3,16,14.1355,-.25,-6.3548,13.2498,-.25,-8.15,19,-.25,-19],
// 3 16 1.99665 -.25 -15.6691 0 -.25 -15.8 19 -.25 -19
  [3,16,1.99665,-.25,-15.6691,0,-.25,-15.8,19,-.25,-19],
// 3 16 3.96015 -.25 -15.27895 1.99665 -.25 -15.6691 19 -.25 -19
  [3,16,3.96015,-.25,-15.27895,1.99665,-.25,-15.6691,19,-.25,-19],
// 3 16 -3.96015 -.25 -15.27895 -19 -.25 -19 -1.99665 -.25 -15.6691
  [3,16,-3.96015,-.25,-15.27895,-19,-.25,-19,-1.99665,-.25,-15.6691],
// 4 16 0 -.25 14.8 1.99665 -.25 14.6691 7.34655 -.25 17.4741 -19 -.25 19
  [4,16,0,-.25,14.8,1.99665,-.25,14.6691,7.34655,-.25,17.4741,-19,-.25,19],
// 4 16 11.8932 -.25 14.8493 10.82135 -.25 10.31625 12.138 -.25 8.8143 19 -.25 19
  [4,16,11.8932,-.25,14.8493,10.82135,-.25,10.31625,12.138,-.25,8.8143,19,-.25,19],
// 3 16 -3.96015 -.25 -15.27895 -5.8548 -.25 -14.6355 -19 -.25 -19
  [3,16,-3.96015,-.25,-15.27895,-5.8548,-.25,-14.6355,-19,-.25,-19],
// 3 16 0 -.25 -15.8 -1.99665 -.25 -15.6691 -19 -.25 -19
  [3,16,0,-.25,-15.8,-1.99665,-.25,-15.6691,-19,-.25,-19],
// 3 16 -19 -.25 -19 19 -.25 -19 0 -.25 -15.8
  [3,16,-19,-.25,-19,19,-.25,-19,0,-.25,-15.8],
// 3 16 15.3 -.25 -.5 19 -.25 -19 19 -.25 19
  [3,16,15.3,-.25,-.5,19,-.25,-19,19,-.25,19],
// 3 16 15.1691 -.25 1.49665 15.3 -.25 -.5 19 -.25 19
  [3,16,15.1691,-.25,1.49665,15.3,-.25,-.5,19,-.25,19],
// 3 16 15.1691 -.25 1.49665 19 -.25 19 14.77895 -.25 3.46015
  [3,16,15.1691,-.25,1.49665,19,-.25,19,14.77895,-.25,3.46015],
// 3 16 -15.3 -.25 -.5 -19 -.25 19 -19 -.25 -19
  [3,16,-15.3,-.25,-.5,-19,-.25,19,-19,-.25,-19],
// 3 16 -15.3 -.25 -.5 -19 -.25 -19 -15.1691 -.25 -2.4975
  [3,16,-15.3,-.25,-.5,-19,-.25,-19,-15.1691,-.25,-2.4975],
// 3 16 -15.3 -.25 -.5 -15.1691 -.25 1.49665 -19 -.25 19
  [3,16,-15.3,-.25,-.5,-15.1691,-.25,1.49665,-19,-.25,19],
// 3 16 -14.77895 -.25 -4.46015 -15.1691 -.25 -2.4975 -19 -.25 -19
  [3,16,-14.77895,-.25,-4.46015,-15.1691,-.25,-2.4975,-19,-.25,-19],
// 3 16 15.3 -.25 -.5 15.1691 -.25 -2.4975 19 -.25 -19
  [3,16,15.3,-.25,-.5,15.1691,-.25,-2.4975,19,-.25,-19],
// 3 16 19 -.25 -19 15.1691 -.25 -2.4975 14.77895 -.25 -4.46015
  [3,16,19,-.25,-19,15.1691,-.25,-2.4975,14.77895,-.25,-4.46015],
// 3 16 19 -.25 -19 14.77895 -.25 -4.46015 14.1355 -.25 -6.3548
  [3,16,19,-.25,-19,14.77895,-.25,-4.46015,14.1355,-.25,-6.3548],
// 3 16 -19 -.25 19 7.34655 -.25 17.4741 19 -.25 19
  [3,16,-19,-.25,19,7.34655,-.25,17.4741,19,-.25,19],
];
module ldraw_lib__169655e(step=0, col=false, unit=2/5, alt=false, line=0.2, solid=!$preview)
    makepoly(ldraw_lib__169655e(), step=step, col=col, unit=unit, alt=alt, line=line, solid=solid);
ldraw_lib__169655e(line=0.2);
